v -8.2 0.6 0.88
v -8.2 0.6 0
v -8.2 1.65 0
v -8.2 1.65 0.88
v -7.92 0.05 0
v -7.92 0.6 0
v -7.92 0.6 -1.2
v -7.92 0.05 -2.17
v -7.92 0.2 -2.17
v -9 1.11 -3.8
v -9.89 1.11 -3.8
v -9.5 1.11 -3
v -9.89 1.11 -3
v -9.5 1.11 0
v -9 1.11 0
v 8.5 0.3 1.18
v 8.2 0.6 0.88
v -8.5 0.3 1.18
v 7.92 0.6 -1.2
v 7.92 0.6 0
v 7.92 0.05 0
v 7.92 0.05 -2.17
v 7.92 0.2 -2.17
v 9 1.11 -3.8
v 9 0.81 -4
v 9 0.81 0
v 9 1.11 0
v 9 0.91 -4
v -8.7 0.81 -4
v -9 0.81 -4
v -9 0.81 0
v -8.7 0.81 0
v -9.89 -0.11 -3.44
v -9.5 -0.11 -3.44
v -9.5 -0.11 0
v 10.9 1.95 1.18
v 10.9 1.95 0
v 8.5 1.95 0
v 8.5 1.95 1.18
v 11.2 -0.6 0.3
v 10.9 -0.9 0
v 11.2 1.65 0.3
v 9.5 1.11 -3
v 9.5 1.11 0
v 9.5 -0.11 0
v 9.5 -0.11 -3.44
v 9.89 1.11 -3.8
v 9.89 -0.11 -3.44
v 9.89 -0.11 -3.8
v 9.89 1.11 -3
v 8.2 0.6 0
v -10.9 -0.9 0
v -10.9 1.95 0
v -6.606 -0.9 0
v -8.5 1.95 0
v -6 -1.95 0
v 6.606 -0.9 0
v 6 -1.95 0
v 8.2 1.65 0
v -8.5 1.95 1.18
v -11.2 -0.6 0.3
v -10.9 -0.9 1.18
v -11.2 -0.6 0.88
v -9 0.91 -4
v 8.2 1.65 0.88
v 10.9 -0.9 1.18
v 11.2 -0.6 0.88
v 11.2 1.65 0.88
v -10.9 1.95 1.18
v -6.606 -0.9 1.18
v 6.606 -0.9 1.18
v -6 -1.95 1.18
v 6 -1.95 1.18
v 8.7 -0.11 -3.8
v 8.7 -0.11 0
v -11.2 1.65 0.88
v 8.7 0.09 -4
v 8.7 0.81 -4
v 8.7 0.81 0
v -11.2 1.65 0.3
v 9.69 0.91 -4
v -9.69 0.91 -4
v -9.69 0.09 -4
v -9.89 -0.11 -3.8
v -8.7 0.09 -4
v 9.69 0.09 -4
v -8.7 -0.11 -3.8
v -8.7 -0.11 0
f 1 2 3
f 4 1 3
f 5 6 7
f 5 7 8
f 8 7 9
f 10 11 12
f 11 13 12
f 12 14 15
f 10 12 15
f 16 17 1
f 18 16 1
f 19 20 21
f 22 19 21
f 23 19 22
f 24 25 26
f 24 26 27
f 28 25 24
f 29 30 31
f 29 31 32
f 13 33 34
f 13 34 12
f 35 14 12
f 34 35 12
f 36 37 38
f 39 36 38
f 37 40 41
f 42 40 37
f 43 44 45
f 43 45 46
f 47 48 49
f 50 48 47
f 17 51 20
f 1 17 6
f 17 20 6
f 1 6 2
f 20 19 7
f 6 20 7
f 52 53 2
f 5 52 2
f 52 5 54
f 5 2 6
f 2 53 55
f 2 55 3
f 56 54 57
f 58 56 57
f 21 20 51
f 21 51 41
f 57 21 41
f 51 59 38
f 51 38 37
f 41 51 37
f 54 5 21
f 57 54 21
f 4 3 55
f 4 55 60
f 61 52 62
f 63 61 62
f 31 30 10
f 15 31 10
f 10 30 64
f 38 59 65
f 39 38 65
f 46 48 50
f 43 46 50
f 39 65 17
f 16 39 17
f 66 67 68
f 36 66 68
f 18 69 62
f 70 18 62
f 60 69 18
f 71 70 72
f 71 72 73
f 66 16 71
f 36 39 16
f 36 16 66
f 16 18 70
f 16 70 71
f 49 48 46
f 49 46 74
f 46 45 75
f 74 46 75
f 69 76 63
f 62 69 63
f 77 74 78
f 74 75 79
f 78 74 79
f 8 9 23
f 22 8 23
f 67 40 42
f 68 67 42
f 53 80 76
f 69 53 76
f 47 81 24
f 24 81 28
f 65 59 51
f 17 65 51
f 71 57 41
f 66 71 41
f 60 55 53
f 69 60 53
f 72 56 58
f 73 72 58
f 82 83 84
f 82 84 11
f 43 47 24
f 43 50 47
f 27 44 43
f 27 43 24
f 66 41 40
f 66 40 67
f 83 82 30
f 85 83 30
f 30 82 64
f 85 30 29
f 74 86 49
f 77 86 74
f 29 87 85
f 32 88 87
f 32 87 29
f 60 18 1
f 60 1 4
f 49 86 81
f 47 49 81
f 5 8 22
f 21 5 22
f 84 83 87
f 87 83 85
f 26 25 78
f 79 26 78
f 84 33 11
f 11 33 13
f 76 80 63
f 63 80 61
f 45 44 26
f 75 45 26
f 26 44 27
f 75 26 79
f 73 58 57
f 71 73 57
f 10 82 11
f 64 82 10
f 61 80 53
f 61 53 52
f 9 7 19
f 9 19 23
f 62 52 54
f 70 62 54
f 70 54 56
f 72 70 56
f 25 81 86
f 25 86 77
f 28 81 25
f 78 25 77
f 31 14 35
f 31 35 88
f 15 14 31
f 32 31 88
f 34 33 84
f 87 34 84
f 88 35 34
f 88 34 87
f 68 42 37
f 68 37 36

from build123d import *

# Parameters (mm, degrees)
BOSS_EXTRUDE1_DEPTH     = 1.18
SKETCH2_W               = 15.84
SKETCH2_H               = 2.17
BOSS_EXTRUDE2_DEPTH     = 0.55
CUT_EXTRUDE1_DEPTH      = 4.28
CUT_EXTRUDE1_DEPTH_BACK = 20.12
CHAMFER1_SIZE           = 0.3
CHAMFER2_SIZE           = 0.3
SKETCH4_W               = 1.19
SKETCH4_H               = 1.22
BOSS_EXTRUDE3_DEPTH     = 4
SKETCH5_W               = 0.3
SKETCH5_H               = 0.3
CUT_EXTRUDE2_DEPTH      = 4
CHAMFER3_SIZE           = 0.2
CUT_EXTRUDE3_DEPTH      = 0.39


with BuildPart() as part:
    # Sketch1 → Boss-Extrude1 (new body)
    with BuildSketch(Plane.XY):
        Polygon((-8.2, 0.6), (-8.2, 1.95), (-11.2, 1.95), (-11.2, -0.9), (-6.606217783, -0.9), (-6, -1.95), (6, -1.95), (6.606217783, -0.9), (11.2, -0.9), (11.2, 1.95), (8.2, 1.95), (8.2, 0.6), align=None)
    extrude(amount=BOSS_EXTRUDE1_DEPTH)

    # Sketch2 → Boss-Extrude2 (add)
    with BuildSketch(Plane(origin=(0, 0.6, 0), x_dir=(1, 0, 0), z_dir=(0, 1, 0))):
        with Locations((0, 1.085)):
            Rectangle(SKETCH2_W, SKETCH2_H)
    extrude(amount=-BOSS_EXTRUDE2_DEPTH)

    # Sketch3 → Cut-Extrude1 (cut, two sides)
    with BuildSketch(Plane.ZY.offset(7.92)) as cut_extrude1_sk:
        Polygon((-1.2, 0.6), (-2.17, 0.2), (-2.17, 0.6), align=None)
    extrude(amount=CUT_EXTRUDE1_DEPTH, mode=Mode.SUBTRACT)
    extrude(cut_extrude1_sk.sketch, amount=-CUT_EXTRUDE1_DEPTH_BACK, mode=Mode.SUBTRACT)

    # Chamfer1
    chamfer1_edges = [part.edges().sort_by_distance(p)[0] for p in [
        (11.2, 0.525, 0),
        (-11.2, 0.525, 1.18),
        (-11.2, 0.525, 0),
        (11.2, 1.95, 0.59),
        (11.2, -0.9, 0.59),
        (-11.2, -0.9, 0.59),
        (-11.2, 1.95, 0.59),
        (11.2, 0.525, 1.18),
    ]]
    chamfer(chamfer1_edges, length=CHAMFER1_SIZE)

    # Chamfer2
    chamfer2_edges = [part.edges().sort_by_distance(p)[0] for p in [
        (8.2, 1.95, 0.59),
        (-8.2, 1.95, 0.59),
        (8.2, 1.275, 1.18),
        (0, 0.6, 1.18),
        (-8.2, 1.275, 1.18),
    ]]
    chamfer(chamfer2_edges, length=CHAMFER2_SIZE)


with BuildPart() as body_2:
    # Sketch4 → Boss-Extrude3 (new body)
    with BuildSketch(Plane(origin=(0, 0, 0), x_dir=(-1, 0, 0), z_dir=(0, 0, -1))):
        with Locations((-9.295, 0.5)):
            Rectangle(SKETCH4_W, SKETCH4_H)
    extrude(amount=BOSS_EXTRUDE3_DEPTH)

    # Sketch5 → Cut-Extrude2 (cut)
    with BuildSketch(Plane(origin=(0, 0, -4), x_dir=(-1, 0, 0), z_dir=(0, 0, -1))):
        with Locations((-8.85, 0.96)):
            Rectangle(SKETCH5_W, SKETCH5_H)
    extrude(amount=-CUT_EXTRUDE2_DEPTH, mode=Mode.SUBTRACT)

    # Chamfer3
    chamfer3_edges = [body_2.edges().sort_by_distance(p)[0] for p in [
        (9.89, 0.5, -4),
        (9.295, -0.11, -4),
        (9.445, 1.11, -4),
    ]]
    chamfer(chamfer3_edges, length=CHAMFER3_SIZE)

    # Sketch6 → Cut-Extrude3 (cut)
    with BuildSketch(Plane(origin=(9.89, 0, 0), x_dir=(0, 0, -1), z_dir=(1, 0, 0))):
        Polygon((3.44, -0.11), (3, 1.11), (0, 1.11), (0, -0.11), align=None)
    extrude(amount=-CUT_EXTRUDE3_DEPTH, mode=Mode.SUBTRACT)


with BuildPart() as body_3:
    # Mirror1: mirrored copy
    add(body_2.part.mirror(Plane(origin=(0, 0, 0), x_dir=(0, 0, 1), z_dir=(1, 0, 0))))


solid = Compound([part.part, body_2.part, body_3.part])
